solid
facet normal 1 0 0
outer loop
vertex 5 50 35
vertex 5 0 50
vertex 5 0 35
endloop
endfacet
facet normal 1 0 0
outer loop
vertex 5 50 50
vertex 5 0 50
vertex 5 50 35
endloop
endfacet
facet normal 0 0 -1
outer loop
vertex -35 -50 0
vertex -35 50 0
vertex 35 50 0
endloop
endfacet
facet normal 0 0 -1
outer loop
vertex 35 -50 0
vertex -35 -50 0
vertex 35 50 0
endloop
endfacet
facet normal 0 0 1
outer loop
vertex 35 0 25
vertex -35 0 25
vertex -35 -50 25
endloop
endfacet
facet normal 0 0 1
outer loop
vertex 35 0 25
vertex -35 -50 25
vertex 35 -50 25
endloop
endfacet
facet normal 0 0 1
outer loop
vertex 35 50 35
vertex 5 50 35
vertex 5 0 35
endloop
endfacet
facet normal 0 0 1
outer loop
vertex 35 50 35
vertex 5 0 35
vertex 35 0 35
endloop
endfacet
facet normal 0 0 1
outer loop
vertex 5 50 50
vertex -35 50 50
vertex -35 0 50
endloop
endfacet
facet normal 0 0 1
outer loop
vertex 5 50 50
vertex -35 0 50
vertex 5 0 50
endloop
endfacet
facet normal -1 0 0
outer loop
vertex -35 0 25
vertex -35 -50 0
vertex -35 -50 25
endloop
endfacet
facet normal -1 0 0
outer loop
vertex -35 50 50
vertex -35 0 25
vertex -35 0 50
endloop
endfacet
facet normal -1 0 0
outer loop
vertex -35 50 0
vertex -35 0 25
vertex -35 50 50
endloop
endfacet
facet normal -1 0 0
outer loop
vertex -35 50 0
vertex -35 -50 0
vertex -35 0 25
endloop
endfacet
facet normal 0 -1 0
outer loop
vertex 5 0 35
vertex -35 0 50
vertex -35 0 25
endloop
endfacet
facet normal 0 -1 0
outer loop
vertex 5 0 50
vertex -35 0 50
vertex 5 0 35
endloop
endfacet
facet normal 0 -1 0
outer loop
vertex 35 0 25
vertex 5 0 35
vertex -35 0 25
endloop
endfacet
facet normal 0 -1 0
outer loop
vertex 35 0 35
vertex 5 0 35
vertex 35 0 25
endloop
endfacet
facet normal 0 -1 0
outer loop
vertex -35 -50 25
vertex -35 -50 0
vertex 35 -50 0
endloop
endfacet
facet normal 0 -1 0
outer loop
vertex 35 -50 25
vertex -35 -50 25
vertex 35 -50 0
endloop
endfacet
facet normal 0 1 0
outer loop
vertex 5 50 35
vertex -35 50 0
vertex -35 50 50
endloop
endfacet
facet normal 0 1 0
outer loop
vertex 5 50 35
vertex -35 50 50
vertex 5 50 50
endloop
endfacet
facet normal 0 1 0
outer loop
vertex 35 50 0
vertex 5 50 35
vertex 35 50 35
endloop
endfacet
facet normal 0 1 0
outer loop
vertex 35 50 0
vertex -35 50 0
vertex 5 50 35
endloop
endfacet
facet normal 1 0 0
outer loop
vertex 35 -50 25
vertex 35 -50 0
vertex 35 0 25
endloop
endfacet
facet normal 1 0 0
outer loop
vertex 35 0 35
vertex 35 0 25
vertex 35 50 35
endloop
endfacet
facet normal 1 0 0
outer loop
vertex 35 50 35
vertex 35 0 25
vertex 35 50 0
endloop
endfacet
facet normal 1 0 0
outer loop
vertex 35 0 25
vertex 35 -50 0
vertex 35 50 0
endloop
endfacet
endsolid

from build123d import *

# Parameters (mm, degrees)
F0_W     = 70
F0_H     = 100
F1_DEPTH = 50
F2_W     = 70
F2_H     = 50
F3_DEPTH = 25
F4_W     = 30
F4_H     = 50
F5_DEPTH = 15


with BuildPart() as f1:
    # F0 (on Top) → F1 (new body)
    with BuildSketch(Plane.XY):
        Rectangle(F0_W, F0_H)
    extrude(amount=F1_DEPTH)

    # F2 (on face) → F3 (cut)
    with BuildSketch(Plane.XY.offset(50)):
        with Locations((0, -25)):
            Rectangle(F2_W, F2_H)
    extrude(amount=-F3_DEPTH, mode=Mode.SUBTRACT)

    # F4 (on face) → F5 (cut)
    with BuildSketch(Plane.XY.offset(50)):
        with Locations((20, 25)):
            Rectangle(F4_W, F4_H)
    extrude(amount=-F5_DEPTH, mode=Mode.SUBTRACT)


solid = f1.part
